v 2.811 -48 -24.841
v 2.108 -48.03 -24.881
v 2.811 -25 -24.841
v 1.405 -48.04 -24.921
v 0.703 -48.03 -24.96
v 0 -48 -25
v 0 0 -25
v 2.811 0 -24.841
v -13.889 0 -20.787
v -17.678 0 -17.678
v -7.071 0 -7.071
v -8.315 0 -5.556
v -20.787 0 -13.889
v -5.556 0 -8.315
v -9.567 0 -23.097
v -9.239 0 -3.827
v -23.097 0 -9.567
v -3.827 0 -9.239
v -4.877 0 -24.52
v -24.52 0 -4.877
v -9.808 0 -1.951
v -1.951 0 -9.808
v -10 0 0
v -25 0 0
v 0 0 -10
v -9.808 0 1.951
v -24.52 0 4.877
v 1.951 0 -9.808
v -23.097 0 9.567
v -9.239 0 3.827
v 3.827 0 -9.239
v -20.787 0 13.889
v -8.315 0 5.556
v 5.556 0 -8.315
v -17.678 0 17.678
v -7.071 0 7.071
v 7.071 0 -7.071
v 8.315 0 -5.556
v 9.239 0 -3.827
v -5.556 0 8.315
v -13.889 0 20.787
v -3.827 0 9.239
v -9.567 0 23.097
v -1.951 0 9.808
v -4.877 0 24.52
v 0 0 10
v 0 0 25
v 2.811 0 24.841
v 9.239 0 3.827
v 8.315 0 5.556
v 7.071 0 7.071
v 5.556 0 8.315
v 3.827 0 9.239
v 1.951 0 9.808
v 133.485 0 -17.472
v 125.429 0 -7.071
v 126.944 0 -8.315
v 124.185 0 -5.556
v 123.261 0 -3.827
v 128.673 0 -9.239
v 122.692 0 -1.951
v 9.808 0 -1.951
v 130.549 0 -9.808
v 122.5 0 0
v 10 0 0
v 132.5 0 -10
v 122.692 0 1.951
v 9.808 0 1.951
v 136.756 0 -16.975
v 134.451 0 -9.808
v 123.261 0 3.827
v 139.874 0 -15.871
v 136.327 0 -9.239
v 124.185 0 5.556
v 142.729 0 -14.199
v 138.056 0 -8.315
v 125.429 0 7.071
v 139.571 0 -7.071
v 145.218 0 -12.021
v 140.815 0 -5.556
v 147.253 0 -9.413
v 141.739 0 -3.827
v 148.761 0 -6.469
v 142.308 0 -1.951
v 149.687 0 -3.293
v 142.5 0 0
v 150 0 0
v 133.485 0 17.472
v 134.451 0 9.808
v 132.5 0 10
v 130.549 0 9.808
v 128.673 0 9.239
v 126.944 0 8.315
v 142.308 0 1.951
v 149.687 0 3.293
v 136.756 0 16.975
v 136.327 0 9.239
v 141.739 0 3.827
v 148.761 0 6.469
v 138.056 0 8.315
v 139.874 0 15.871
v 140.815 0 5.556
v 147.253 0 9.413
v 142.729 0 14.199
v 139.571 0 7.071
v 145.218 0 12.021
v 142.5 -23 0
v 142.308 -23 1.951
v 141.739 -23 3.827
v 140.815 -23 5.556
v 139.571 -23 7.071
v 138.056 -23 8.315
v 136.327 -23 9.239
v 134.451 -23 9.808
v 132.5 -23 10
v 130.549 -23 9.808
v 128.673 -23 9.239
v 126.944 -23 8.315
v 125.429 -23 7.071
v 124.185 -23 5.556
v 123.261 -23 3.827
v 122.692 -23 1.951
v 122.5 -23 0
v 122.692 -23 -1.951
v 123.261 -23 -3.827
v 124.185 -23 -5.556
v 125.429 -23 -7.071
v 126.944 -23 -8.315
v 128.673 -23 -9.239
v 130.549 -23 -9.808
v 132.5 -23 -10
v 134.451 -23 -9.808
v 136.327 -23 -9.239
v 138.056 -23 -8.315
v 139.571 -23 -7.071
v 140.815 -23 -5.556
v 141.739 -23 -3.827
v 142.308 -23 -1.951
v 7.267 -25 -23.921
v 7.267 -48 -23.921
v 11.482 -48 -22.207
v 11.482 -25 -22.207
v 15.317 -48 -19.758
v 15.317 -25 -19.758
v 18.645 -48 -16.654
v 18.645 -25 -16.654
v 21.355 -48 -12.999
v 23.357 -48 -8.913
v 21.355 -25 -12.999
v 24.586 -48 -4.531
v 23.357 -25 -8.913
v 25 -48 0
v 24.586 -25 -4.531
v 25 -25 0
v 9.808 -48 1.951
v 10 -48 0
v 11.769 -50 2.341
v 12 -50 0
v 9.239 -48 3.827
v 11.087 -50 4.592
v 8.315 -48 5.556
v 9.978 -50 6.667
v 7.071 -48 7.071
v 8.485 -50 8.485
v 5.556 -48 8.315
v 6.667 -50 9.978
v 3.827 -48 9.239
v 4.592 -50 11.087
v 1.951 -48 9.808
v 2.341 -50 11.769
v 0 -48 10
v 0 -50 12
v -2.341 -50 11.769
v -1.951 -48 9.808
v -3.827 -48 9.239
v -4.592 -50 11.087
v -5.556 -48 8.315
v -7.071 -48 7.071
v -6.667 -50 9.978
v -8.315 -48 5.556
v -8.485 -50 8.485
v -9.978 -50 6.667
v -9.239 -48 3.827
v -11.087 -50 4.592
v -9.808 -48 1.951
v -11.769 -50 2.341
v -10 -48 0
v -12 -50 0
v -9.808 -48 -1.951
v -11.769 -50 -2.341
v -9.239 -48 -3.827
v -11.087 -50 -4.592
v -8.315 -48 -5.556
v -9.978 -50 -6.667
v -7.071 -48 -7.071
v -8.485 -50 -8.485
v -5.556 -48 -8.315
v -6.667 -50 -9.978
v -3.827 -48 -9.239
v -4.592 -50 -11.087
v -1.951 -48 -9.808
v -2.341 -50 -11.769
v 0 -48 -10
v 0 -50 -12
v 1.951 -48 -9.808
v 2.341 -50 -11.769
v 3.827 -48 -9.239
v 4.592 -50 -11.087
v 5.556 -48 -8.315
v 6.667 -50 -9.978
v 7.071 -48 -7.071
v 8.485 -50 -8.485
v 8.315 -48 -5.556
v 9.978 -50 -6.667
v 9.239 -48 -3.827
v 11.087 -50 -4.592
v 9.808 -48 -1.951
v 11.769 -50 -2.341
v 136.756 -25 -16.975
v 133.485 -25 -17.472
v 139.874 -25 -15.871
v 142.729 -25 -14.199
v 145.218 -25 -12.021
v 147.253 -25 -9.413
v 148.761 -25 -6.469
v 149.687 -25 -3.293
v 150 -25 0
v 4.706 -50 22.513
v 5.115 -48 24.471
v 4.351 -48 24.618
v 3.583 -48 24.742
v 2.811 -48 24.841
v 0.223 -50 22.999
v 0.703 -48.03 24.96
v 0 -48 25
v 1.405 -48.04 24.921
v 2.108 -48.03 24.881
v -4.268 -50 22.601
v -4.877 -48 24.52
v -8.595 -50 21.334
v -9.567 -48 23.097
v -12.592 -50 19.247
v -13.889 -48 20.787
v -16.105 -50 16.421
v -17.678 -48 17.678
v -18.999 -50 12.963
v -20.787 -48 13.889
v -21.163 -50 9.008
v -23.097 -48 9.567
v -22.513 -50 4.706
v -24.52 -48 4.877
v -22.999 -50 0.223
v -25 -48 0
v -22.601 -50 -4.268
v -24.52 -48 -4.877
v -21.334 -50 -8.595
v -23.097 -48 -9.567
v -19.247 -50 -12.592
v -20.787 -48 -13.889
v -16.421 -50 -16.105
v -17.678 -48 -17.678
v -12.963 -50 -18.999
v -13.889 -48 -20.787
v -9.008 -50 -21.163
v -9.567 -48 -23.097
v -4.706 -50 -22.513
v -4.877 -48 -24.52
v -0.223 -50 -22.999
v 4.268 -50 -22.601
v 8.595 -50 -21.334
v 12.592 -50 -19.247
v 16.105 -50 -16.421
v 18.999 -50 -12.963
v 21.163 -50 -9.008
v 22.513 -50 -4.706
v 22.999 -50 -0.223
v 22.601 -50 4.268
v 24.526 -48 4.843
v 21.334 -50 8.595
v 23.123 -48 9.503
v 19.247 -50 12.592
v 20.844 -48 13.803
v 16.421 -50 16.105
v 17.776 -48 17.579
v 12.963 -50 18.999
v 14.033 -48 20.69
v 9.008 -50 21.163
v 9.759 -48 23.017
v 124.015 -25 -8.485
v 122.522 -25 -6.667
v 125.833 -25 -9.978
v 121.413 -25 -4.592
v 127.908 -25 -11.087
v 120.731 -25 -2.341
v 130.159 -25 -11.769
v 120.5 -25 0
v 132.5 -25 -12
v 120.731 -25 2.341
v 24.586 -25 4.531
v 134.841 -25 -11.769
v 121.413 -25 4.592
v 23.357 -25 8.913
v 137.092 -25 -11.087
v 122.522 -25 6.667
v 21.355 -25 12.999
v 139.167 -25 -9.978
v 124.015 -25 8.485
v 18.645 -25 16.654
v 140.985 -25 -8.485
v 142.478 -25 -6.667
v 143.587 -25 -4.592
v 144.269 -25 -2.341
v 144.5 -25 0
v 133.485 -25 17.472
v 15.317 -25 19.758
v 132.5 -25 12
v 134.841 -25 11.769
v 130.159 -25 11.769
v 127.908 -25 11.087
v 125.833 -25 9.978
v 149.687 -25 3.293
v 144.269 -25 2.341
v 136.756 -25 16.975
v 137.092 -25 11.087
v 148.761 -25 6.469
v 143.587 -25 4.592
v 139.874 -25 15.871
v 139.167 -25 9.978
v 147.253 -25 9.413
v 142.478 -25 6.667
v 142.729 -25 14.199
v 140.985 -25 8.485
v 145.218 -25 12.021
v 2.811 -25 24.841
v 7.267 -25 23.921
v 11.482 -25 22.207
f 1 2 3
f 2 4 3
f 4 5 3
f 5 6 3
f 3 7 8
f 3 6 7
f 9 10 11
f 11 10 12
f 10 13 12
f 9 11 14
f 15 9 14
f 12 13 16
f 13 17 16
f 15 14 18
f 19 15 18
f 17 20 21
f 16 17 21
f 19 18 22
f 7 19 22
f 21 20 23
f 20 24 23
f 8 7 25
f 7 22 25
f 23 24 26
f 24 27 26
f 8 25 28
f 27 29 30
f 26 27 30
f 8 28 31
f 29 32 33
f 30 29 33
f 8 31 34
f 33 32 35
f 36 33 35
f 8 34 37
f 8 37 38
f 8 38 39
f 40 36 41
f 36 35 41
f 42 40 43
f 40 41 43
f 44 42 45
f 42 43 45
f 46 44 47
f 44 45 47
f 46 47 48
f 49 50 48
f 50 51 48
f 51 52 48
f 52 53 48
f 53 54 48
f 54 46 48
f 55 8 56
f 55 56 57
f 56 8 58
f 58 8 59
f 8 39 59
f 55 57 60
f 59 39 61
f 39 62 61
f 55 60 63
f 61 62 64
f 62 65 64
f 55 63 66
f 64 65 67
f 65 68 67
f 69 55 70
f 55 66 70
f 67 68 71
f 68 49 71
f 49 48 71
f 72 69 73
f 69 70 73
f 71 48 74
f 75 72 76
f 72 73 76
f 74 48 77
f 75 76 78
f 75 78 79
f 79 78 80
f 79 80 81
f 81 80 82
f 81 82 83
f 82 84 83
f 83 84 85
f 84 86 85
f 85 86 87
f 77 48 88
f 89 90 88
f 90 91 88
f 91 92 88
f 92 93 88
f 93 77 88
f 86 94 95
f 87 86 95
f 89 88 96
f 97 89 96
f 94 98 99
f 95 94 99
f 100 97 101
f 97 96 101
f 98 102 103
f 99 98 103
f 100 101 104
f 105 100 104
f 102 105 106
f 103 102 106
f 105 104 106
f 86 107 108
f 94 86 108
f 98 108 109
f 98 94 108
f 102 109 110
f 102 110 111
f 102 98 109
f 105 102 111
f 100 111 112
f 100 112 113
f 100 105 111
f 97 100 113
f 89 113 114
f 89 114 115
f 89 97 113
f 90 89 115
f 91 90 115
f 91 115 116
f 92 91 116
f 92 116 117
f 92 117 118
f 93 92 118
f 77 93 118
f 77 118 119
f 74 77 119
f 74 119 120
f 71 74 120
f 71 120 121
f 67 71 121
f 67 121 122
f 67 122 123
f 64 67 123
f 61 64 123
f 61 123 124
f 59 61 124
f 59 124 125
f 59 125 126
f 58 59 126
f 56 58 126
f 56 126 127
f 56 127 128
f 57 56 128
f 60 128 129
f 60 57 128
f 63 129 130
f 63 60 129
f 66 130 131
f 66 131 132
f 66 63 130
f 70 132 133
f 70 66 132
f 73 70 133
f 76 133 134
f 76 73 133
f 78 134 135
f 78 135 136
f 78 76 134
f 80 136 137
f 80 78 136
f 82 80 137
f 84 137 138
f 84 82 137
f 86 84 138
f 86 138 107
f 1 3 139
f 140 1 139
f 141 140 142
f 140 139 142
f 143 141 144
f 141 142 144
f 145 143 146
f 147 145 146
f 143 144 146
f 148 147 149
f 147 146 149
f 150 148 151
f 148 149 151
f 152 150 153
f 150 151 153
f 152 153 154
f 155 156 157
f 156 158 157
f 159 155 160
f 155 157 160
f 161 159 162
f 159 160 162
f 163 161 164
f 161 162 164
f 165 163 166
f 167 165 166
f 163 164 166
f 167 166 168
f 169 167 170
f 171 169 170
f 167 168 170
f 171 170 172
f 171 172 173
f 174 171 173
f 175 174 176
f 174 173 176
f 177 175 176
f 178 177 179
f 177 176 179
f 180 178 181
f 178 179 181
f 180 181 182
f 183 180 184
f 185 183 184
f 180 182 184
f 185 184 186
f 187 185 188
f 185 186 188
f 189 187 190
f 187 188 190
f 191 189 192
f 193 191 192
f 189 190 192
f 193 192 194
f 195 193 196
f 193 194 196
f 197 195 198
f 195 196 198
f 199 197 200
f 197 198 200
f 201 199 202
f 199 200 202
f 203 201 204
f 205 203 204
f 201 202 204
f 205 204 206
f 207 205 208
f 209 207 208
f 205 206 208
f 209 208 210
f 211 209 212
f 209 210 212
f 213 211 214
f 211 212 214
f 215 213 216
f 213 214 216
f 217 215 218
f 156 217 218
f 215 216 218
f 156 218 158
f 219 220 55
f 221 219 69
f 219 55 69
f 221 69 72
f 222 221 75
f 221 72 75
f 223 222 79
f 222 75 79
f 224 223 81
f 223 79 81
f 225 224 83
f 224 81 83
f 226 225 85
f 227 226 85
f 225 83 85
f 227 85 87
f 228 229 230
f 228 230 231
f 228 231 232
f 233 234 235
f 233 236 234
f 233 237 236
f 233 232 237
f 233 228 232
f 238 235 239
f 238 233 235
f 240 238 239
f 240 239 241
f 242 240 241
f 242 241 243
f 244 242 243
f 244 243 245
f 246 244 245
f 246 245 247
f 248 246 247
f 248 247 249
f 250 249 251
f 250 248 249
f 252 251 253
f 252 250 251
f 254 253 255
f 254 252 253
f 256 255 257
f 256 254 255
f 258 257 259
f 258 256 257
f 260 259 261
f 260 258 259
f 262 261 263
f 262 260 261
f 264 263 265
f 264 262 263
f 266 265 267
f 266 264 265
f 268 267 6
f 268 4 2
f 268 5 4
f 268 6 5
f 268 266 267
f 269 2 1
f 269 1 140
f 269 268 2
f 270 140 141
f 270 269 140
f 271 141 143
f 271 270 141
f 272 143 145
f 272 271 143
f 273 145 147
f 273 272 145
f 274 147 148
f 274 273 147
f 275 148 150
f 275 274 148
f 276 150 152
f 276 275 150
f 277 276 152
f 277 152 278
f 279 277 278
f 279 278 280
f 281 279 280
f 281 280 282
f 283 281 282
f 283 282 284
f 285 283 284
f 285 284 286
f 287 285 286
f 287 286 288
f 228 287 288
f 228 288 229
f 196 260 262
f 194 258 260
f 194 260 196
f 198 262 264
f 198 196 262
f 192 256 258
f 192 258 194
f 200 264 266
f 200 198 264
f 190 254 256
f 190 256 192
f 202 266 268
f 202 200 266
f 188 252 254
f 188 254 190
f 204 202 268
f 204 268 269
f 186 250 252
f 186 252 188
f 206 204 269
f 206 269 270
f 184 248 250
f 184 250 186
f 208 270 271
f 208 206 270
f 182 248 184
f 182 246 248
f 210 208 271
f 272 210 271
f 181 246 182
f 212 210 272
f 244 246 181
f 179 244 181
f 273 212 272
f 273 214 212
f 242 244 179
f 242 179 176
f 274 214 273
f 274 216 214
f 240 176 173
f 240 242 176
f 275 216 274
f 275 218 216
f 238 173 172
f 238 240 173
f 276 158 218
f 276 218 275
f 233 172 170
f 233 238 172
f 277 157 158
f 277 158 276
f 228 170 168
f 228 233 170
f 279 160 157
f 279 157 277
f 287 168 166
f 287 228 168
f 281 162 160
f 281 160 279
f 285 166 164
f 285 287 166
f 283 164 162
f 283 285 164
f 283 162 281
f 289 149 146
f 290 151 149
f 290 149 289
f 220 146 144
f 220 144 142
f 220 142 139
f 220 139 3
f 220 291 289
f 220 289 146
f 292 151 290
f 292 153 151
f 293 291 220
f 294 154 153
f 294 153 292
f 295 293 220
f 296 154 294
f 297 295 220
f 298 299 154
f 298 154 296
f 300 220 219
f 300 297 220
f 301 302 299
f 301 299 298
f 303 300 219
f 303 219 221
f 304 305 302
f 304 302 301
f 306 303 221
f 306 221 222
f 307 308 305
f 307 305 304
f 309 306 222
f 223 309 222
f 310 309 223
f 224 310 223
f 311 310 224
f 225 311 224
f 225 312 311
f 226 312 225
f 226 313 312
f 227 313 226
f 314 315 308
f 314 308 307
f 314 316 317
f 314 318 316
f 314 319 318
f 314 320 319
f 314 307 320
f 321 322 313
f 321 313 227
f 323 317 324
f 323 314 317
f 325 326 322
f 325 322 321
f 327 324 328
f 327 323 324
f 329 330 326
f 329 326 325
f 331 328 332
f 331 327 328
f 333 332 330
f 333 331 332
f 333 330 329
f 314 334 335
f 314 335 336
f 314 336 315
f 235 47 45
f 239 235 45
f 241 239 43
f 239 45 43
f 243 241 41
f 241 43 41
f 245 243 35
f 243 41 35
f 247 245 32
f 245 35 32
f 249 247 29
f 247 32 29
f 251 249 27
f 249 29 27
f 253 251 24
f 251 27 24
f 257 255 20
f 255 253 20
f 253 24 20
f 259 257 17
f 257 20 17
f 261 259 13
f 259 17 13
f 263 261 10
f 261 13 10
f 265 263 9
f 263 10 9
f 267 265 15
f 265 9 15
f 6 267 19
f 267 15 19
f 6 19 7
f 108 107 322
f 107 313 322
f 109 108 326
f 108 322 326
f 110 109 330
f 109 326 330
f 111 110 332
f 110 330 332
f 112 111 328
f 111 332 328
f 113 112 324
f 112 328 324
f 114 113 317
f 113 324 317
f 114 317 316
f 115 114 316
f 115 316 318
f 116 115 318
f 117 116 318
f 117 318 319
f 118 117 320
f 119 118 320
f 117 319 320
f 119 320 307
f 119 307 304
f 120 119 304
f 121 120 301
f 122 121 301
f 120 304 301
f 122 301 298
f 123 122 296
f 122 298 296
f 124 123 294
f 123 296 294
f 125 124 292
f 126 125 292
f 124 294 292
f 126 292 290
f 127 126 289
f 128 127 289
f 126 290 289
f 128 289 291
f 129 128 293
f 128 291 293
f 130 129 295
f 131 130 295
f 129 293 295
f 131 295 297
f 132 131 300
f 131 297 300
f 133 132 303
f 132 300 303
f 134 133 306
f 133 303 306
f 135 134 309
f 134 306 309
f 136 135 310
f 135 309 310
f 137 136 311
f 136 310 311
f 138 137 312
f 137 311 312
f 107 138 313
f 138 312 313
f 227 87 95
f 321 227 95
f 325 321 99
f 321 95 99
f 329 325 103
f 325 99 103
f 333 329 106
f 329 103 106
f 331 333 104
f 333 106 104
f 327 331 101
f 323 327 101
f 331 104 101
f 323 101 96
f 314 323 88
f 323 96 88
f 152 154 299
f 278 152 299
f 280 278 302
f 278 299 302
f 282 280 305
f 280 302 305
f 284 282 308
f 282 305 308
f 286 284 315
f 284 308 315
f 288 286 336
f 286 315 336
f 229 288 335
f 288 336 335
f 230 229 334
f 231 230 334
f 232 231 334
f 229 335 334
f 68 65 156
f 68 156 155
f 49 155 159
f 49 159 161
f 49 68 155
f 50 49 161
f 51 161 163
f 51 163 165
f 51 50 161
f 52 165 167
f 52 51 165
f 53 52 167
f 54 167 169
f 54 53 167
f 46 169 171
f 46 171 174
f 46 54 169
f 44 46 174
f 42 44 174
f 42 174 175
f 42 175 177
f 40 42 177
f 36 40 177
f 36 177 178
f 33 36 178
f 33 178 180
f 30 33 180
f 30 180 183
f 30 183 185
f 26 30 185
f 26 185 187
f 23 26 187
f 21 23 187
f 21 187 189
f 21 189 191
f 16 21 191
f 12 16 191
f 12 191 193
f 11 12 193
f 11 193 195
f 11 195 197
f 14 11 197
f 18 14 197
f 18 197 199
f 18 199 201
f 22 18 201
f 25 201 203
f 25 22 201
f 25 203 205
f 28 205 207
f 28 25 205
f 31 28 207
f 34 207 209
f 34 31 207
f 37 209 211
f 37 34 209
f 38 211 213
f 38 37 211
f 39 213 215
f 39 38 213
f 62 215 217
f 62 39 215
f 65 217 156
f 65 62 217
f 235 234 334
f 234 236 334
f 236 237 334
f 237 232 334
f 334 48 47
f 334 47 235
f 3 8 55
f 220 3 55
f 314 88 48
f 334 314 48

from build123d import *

# Parameters (mm, degrees)
F0_R        = 10
F1_DEPTH    = 25
F2_DEPTH    = 50
F3_T4_ANGLE = 203.6133668192
F3_T8_ANGLE = 190.697258089


# Not quite as in the source:
# - a fillet or chamfer that OpenCascade refuses, or shapes differently, is made with other operations: its cross-section is extruded or revolved along the edge and cut away or added


with BuildPart() as f1:
    # F0 (on Front) → F1 (new body)
    with BuildSketch(Plane.XZ):
        with BuildLine():
            Line((2.8107571296, 24.8414903812), (0, 25))
            ThreePointArc((0, 25), (-25, 0), (0, -25))
            Line((0, -25), (2.8107571296, -24.8414903812))
            ThreePointArc((2.8107571296, -24.8414903812), (18.6449581421, -16.6542948179), (25, 0))
            ThreePointArc((25, 0), (18.6449581421, 16.6542948179), (2.8107571296, 24.8414903812))
        make_face()
        Circle(F0_R, mode=Mode.SUBTRACT)
        with BuildLine():
            Line((133.4853280749, 17.4722387972), (2.8107571296, 24.8414903812))
            ThreePointArc((2.8107571296, 24.8414903812), (18.6449581421, 16.6542948179), (25, 0))
            ThreePointArc((25, 0), (18.6449581421, -16.6542948179), (2.8107571296, -24.8414903812))
            Line((2.8107571296, -24.8414903812), (133.4853280749, -17.4722387972))
            ThreePointArc((133.4853280749, -17.4722387972), (115, 0), (133.4853280749, 17.4722387972))
        make_face()
        with BuildLine():
            ThreePointArc((150, 0), (145.2179644855, 12.0209558415), (133.4853280749, 17.4722387972))
            ThreePointArc((133.4853280749, 17.4722387972), (115, 0), (133.4853280749, -17.4722387972))
            ThreePointArc((133.4853280749, -17.4722387972), (145.2179644855, -12.0209558415), (150, 0))
        make_face()
        with Locations((132.5, 0)):
            Circle(F0_R, mode=Mode.SUBTRACT)
    extrude(amount=F1_DEPTH)

    # F0 (on Front) → F2 (join)
    with BuildSketch(Plane.XZ):
        with BuildLine():
            Line((2.8107571296, 24.8414903812), (0, 25))
            ThreePointArc((0, 25), (-25, 0), (0, -25))
            Line((0, -25), (2.8107571296, -24.8414903812))
            ThreePointArc((2.8107571296, -24.8414903812), (18.6449581421, -16.6542948179), (25, 0))
            ThreePointArc((25, 0), (18.6449581421, 16.6542948179), (2.8107571296, 24.8414903812))
        make_face()
        Circle(F0_R, mode=Mode.SUBTRACT)
    extrude(amount=F2_DEPTH)

    # F3: chamfer of 2 on 4 edges, made by hand

    # F3_s1 → F3_t2 (revolve, cut)
    with BuildSketch(Plane.XY):
        Polygon((10, -48), (12, -50), (10, -50), align=None)
    revolve(axis=Axis((0, -50, 0), (0, -1, 0)), mode=Mode.SUBTRACT)

    # F3_s3 → F3_t4 (revolve, cut)
    with BuildSketch(Plane(origin=(0, 0, 0), x_dir=(0, 1, 0), z_dir=(0.9788435281, 0, -0.2046102329))):
        Polygon((-48, 25), (-50, 23), (-50, 25), align=None)
    revolve(axis=Axis((0, -50, 0), (0, -1, 0)), revolution_arc=F3_T4_ANGLE, mode=Mode.SUBTRACT)

    # F3_s5 → F3_t6 (revolve, cut)
    with BuildSketch(Plane.XY):
        Polygon((142.5, -23), (144.5, -25), (142.5, -25), align=None)
    revolve(axis=Axis((132.5, -25, 0), (0, -1, 0)), mode=Mode.SUBTRACT)

    # F3_s7 → F3_t8 (revolve, cut)
    with BuildSketch(Plane(origin=(0, 0, 0), x_dir=(0, 1, 0), z_dir=(-0.9956459412, 0, -0.0932156624))):
        Polygon((-48, -25), (-50, -23), (-50, -25), align=None)
    revolve(axis=Axis((0, -50, 0), (0, 1, 0)), revolution_arc=F3_T8_ANGLE, mode=Mode.SUBTRACT)


solid = f1.part
